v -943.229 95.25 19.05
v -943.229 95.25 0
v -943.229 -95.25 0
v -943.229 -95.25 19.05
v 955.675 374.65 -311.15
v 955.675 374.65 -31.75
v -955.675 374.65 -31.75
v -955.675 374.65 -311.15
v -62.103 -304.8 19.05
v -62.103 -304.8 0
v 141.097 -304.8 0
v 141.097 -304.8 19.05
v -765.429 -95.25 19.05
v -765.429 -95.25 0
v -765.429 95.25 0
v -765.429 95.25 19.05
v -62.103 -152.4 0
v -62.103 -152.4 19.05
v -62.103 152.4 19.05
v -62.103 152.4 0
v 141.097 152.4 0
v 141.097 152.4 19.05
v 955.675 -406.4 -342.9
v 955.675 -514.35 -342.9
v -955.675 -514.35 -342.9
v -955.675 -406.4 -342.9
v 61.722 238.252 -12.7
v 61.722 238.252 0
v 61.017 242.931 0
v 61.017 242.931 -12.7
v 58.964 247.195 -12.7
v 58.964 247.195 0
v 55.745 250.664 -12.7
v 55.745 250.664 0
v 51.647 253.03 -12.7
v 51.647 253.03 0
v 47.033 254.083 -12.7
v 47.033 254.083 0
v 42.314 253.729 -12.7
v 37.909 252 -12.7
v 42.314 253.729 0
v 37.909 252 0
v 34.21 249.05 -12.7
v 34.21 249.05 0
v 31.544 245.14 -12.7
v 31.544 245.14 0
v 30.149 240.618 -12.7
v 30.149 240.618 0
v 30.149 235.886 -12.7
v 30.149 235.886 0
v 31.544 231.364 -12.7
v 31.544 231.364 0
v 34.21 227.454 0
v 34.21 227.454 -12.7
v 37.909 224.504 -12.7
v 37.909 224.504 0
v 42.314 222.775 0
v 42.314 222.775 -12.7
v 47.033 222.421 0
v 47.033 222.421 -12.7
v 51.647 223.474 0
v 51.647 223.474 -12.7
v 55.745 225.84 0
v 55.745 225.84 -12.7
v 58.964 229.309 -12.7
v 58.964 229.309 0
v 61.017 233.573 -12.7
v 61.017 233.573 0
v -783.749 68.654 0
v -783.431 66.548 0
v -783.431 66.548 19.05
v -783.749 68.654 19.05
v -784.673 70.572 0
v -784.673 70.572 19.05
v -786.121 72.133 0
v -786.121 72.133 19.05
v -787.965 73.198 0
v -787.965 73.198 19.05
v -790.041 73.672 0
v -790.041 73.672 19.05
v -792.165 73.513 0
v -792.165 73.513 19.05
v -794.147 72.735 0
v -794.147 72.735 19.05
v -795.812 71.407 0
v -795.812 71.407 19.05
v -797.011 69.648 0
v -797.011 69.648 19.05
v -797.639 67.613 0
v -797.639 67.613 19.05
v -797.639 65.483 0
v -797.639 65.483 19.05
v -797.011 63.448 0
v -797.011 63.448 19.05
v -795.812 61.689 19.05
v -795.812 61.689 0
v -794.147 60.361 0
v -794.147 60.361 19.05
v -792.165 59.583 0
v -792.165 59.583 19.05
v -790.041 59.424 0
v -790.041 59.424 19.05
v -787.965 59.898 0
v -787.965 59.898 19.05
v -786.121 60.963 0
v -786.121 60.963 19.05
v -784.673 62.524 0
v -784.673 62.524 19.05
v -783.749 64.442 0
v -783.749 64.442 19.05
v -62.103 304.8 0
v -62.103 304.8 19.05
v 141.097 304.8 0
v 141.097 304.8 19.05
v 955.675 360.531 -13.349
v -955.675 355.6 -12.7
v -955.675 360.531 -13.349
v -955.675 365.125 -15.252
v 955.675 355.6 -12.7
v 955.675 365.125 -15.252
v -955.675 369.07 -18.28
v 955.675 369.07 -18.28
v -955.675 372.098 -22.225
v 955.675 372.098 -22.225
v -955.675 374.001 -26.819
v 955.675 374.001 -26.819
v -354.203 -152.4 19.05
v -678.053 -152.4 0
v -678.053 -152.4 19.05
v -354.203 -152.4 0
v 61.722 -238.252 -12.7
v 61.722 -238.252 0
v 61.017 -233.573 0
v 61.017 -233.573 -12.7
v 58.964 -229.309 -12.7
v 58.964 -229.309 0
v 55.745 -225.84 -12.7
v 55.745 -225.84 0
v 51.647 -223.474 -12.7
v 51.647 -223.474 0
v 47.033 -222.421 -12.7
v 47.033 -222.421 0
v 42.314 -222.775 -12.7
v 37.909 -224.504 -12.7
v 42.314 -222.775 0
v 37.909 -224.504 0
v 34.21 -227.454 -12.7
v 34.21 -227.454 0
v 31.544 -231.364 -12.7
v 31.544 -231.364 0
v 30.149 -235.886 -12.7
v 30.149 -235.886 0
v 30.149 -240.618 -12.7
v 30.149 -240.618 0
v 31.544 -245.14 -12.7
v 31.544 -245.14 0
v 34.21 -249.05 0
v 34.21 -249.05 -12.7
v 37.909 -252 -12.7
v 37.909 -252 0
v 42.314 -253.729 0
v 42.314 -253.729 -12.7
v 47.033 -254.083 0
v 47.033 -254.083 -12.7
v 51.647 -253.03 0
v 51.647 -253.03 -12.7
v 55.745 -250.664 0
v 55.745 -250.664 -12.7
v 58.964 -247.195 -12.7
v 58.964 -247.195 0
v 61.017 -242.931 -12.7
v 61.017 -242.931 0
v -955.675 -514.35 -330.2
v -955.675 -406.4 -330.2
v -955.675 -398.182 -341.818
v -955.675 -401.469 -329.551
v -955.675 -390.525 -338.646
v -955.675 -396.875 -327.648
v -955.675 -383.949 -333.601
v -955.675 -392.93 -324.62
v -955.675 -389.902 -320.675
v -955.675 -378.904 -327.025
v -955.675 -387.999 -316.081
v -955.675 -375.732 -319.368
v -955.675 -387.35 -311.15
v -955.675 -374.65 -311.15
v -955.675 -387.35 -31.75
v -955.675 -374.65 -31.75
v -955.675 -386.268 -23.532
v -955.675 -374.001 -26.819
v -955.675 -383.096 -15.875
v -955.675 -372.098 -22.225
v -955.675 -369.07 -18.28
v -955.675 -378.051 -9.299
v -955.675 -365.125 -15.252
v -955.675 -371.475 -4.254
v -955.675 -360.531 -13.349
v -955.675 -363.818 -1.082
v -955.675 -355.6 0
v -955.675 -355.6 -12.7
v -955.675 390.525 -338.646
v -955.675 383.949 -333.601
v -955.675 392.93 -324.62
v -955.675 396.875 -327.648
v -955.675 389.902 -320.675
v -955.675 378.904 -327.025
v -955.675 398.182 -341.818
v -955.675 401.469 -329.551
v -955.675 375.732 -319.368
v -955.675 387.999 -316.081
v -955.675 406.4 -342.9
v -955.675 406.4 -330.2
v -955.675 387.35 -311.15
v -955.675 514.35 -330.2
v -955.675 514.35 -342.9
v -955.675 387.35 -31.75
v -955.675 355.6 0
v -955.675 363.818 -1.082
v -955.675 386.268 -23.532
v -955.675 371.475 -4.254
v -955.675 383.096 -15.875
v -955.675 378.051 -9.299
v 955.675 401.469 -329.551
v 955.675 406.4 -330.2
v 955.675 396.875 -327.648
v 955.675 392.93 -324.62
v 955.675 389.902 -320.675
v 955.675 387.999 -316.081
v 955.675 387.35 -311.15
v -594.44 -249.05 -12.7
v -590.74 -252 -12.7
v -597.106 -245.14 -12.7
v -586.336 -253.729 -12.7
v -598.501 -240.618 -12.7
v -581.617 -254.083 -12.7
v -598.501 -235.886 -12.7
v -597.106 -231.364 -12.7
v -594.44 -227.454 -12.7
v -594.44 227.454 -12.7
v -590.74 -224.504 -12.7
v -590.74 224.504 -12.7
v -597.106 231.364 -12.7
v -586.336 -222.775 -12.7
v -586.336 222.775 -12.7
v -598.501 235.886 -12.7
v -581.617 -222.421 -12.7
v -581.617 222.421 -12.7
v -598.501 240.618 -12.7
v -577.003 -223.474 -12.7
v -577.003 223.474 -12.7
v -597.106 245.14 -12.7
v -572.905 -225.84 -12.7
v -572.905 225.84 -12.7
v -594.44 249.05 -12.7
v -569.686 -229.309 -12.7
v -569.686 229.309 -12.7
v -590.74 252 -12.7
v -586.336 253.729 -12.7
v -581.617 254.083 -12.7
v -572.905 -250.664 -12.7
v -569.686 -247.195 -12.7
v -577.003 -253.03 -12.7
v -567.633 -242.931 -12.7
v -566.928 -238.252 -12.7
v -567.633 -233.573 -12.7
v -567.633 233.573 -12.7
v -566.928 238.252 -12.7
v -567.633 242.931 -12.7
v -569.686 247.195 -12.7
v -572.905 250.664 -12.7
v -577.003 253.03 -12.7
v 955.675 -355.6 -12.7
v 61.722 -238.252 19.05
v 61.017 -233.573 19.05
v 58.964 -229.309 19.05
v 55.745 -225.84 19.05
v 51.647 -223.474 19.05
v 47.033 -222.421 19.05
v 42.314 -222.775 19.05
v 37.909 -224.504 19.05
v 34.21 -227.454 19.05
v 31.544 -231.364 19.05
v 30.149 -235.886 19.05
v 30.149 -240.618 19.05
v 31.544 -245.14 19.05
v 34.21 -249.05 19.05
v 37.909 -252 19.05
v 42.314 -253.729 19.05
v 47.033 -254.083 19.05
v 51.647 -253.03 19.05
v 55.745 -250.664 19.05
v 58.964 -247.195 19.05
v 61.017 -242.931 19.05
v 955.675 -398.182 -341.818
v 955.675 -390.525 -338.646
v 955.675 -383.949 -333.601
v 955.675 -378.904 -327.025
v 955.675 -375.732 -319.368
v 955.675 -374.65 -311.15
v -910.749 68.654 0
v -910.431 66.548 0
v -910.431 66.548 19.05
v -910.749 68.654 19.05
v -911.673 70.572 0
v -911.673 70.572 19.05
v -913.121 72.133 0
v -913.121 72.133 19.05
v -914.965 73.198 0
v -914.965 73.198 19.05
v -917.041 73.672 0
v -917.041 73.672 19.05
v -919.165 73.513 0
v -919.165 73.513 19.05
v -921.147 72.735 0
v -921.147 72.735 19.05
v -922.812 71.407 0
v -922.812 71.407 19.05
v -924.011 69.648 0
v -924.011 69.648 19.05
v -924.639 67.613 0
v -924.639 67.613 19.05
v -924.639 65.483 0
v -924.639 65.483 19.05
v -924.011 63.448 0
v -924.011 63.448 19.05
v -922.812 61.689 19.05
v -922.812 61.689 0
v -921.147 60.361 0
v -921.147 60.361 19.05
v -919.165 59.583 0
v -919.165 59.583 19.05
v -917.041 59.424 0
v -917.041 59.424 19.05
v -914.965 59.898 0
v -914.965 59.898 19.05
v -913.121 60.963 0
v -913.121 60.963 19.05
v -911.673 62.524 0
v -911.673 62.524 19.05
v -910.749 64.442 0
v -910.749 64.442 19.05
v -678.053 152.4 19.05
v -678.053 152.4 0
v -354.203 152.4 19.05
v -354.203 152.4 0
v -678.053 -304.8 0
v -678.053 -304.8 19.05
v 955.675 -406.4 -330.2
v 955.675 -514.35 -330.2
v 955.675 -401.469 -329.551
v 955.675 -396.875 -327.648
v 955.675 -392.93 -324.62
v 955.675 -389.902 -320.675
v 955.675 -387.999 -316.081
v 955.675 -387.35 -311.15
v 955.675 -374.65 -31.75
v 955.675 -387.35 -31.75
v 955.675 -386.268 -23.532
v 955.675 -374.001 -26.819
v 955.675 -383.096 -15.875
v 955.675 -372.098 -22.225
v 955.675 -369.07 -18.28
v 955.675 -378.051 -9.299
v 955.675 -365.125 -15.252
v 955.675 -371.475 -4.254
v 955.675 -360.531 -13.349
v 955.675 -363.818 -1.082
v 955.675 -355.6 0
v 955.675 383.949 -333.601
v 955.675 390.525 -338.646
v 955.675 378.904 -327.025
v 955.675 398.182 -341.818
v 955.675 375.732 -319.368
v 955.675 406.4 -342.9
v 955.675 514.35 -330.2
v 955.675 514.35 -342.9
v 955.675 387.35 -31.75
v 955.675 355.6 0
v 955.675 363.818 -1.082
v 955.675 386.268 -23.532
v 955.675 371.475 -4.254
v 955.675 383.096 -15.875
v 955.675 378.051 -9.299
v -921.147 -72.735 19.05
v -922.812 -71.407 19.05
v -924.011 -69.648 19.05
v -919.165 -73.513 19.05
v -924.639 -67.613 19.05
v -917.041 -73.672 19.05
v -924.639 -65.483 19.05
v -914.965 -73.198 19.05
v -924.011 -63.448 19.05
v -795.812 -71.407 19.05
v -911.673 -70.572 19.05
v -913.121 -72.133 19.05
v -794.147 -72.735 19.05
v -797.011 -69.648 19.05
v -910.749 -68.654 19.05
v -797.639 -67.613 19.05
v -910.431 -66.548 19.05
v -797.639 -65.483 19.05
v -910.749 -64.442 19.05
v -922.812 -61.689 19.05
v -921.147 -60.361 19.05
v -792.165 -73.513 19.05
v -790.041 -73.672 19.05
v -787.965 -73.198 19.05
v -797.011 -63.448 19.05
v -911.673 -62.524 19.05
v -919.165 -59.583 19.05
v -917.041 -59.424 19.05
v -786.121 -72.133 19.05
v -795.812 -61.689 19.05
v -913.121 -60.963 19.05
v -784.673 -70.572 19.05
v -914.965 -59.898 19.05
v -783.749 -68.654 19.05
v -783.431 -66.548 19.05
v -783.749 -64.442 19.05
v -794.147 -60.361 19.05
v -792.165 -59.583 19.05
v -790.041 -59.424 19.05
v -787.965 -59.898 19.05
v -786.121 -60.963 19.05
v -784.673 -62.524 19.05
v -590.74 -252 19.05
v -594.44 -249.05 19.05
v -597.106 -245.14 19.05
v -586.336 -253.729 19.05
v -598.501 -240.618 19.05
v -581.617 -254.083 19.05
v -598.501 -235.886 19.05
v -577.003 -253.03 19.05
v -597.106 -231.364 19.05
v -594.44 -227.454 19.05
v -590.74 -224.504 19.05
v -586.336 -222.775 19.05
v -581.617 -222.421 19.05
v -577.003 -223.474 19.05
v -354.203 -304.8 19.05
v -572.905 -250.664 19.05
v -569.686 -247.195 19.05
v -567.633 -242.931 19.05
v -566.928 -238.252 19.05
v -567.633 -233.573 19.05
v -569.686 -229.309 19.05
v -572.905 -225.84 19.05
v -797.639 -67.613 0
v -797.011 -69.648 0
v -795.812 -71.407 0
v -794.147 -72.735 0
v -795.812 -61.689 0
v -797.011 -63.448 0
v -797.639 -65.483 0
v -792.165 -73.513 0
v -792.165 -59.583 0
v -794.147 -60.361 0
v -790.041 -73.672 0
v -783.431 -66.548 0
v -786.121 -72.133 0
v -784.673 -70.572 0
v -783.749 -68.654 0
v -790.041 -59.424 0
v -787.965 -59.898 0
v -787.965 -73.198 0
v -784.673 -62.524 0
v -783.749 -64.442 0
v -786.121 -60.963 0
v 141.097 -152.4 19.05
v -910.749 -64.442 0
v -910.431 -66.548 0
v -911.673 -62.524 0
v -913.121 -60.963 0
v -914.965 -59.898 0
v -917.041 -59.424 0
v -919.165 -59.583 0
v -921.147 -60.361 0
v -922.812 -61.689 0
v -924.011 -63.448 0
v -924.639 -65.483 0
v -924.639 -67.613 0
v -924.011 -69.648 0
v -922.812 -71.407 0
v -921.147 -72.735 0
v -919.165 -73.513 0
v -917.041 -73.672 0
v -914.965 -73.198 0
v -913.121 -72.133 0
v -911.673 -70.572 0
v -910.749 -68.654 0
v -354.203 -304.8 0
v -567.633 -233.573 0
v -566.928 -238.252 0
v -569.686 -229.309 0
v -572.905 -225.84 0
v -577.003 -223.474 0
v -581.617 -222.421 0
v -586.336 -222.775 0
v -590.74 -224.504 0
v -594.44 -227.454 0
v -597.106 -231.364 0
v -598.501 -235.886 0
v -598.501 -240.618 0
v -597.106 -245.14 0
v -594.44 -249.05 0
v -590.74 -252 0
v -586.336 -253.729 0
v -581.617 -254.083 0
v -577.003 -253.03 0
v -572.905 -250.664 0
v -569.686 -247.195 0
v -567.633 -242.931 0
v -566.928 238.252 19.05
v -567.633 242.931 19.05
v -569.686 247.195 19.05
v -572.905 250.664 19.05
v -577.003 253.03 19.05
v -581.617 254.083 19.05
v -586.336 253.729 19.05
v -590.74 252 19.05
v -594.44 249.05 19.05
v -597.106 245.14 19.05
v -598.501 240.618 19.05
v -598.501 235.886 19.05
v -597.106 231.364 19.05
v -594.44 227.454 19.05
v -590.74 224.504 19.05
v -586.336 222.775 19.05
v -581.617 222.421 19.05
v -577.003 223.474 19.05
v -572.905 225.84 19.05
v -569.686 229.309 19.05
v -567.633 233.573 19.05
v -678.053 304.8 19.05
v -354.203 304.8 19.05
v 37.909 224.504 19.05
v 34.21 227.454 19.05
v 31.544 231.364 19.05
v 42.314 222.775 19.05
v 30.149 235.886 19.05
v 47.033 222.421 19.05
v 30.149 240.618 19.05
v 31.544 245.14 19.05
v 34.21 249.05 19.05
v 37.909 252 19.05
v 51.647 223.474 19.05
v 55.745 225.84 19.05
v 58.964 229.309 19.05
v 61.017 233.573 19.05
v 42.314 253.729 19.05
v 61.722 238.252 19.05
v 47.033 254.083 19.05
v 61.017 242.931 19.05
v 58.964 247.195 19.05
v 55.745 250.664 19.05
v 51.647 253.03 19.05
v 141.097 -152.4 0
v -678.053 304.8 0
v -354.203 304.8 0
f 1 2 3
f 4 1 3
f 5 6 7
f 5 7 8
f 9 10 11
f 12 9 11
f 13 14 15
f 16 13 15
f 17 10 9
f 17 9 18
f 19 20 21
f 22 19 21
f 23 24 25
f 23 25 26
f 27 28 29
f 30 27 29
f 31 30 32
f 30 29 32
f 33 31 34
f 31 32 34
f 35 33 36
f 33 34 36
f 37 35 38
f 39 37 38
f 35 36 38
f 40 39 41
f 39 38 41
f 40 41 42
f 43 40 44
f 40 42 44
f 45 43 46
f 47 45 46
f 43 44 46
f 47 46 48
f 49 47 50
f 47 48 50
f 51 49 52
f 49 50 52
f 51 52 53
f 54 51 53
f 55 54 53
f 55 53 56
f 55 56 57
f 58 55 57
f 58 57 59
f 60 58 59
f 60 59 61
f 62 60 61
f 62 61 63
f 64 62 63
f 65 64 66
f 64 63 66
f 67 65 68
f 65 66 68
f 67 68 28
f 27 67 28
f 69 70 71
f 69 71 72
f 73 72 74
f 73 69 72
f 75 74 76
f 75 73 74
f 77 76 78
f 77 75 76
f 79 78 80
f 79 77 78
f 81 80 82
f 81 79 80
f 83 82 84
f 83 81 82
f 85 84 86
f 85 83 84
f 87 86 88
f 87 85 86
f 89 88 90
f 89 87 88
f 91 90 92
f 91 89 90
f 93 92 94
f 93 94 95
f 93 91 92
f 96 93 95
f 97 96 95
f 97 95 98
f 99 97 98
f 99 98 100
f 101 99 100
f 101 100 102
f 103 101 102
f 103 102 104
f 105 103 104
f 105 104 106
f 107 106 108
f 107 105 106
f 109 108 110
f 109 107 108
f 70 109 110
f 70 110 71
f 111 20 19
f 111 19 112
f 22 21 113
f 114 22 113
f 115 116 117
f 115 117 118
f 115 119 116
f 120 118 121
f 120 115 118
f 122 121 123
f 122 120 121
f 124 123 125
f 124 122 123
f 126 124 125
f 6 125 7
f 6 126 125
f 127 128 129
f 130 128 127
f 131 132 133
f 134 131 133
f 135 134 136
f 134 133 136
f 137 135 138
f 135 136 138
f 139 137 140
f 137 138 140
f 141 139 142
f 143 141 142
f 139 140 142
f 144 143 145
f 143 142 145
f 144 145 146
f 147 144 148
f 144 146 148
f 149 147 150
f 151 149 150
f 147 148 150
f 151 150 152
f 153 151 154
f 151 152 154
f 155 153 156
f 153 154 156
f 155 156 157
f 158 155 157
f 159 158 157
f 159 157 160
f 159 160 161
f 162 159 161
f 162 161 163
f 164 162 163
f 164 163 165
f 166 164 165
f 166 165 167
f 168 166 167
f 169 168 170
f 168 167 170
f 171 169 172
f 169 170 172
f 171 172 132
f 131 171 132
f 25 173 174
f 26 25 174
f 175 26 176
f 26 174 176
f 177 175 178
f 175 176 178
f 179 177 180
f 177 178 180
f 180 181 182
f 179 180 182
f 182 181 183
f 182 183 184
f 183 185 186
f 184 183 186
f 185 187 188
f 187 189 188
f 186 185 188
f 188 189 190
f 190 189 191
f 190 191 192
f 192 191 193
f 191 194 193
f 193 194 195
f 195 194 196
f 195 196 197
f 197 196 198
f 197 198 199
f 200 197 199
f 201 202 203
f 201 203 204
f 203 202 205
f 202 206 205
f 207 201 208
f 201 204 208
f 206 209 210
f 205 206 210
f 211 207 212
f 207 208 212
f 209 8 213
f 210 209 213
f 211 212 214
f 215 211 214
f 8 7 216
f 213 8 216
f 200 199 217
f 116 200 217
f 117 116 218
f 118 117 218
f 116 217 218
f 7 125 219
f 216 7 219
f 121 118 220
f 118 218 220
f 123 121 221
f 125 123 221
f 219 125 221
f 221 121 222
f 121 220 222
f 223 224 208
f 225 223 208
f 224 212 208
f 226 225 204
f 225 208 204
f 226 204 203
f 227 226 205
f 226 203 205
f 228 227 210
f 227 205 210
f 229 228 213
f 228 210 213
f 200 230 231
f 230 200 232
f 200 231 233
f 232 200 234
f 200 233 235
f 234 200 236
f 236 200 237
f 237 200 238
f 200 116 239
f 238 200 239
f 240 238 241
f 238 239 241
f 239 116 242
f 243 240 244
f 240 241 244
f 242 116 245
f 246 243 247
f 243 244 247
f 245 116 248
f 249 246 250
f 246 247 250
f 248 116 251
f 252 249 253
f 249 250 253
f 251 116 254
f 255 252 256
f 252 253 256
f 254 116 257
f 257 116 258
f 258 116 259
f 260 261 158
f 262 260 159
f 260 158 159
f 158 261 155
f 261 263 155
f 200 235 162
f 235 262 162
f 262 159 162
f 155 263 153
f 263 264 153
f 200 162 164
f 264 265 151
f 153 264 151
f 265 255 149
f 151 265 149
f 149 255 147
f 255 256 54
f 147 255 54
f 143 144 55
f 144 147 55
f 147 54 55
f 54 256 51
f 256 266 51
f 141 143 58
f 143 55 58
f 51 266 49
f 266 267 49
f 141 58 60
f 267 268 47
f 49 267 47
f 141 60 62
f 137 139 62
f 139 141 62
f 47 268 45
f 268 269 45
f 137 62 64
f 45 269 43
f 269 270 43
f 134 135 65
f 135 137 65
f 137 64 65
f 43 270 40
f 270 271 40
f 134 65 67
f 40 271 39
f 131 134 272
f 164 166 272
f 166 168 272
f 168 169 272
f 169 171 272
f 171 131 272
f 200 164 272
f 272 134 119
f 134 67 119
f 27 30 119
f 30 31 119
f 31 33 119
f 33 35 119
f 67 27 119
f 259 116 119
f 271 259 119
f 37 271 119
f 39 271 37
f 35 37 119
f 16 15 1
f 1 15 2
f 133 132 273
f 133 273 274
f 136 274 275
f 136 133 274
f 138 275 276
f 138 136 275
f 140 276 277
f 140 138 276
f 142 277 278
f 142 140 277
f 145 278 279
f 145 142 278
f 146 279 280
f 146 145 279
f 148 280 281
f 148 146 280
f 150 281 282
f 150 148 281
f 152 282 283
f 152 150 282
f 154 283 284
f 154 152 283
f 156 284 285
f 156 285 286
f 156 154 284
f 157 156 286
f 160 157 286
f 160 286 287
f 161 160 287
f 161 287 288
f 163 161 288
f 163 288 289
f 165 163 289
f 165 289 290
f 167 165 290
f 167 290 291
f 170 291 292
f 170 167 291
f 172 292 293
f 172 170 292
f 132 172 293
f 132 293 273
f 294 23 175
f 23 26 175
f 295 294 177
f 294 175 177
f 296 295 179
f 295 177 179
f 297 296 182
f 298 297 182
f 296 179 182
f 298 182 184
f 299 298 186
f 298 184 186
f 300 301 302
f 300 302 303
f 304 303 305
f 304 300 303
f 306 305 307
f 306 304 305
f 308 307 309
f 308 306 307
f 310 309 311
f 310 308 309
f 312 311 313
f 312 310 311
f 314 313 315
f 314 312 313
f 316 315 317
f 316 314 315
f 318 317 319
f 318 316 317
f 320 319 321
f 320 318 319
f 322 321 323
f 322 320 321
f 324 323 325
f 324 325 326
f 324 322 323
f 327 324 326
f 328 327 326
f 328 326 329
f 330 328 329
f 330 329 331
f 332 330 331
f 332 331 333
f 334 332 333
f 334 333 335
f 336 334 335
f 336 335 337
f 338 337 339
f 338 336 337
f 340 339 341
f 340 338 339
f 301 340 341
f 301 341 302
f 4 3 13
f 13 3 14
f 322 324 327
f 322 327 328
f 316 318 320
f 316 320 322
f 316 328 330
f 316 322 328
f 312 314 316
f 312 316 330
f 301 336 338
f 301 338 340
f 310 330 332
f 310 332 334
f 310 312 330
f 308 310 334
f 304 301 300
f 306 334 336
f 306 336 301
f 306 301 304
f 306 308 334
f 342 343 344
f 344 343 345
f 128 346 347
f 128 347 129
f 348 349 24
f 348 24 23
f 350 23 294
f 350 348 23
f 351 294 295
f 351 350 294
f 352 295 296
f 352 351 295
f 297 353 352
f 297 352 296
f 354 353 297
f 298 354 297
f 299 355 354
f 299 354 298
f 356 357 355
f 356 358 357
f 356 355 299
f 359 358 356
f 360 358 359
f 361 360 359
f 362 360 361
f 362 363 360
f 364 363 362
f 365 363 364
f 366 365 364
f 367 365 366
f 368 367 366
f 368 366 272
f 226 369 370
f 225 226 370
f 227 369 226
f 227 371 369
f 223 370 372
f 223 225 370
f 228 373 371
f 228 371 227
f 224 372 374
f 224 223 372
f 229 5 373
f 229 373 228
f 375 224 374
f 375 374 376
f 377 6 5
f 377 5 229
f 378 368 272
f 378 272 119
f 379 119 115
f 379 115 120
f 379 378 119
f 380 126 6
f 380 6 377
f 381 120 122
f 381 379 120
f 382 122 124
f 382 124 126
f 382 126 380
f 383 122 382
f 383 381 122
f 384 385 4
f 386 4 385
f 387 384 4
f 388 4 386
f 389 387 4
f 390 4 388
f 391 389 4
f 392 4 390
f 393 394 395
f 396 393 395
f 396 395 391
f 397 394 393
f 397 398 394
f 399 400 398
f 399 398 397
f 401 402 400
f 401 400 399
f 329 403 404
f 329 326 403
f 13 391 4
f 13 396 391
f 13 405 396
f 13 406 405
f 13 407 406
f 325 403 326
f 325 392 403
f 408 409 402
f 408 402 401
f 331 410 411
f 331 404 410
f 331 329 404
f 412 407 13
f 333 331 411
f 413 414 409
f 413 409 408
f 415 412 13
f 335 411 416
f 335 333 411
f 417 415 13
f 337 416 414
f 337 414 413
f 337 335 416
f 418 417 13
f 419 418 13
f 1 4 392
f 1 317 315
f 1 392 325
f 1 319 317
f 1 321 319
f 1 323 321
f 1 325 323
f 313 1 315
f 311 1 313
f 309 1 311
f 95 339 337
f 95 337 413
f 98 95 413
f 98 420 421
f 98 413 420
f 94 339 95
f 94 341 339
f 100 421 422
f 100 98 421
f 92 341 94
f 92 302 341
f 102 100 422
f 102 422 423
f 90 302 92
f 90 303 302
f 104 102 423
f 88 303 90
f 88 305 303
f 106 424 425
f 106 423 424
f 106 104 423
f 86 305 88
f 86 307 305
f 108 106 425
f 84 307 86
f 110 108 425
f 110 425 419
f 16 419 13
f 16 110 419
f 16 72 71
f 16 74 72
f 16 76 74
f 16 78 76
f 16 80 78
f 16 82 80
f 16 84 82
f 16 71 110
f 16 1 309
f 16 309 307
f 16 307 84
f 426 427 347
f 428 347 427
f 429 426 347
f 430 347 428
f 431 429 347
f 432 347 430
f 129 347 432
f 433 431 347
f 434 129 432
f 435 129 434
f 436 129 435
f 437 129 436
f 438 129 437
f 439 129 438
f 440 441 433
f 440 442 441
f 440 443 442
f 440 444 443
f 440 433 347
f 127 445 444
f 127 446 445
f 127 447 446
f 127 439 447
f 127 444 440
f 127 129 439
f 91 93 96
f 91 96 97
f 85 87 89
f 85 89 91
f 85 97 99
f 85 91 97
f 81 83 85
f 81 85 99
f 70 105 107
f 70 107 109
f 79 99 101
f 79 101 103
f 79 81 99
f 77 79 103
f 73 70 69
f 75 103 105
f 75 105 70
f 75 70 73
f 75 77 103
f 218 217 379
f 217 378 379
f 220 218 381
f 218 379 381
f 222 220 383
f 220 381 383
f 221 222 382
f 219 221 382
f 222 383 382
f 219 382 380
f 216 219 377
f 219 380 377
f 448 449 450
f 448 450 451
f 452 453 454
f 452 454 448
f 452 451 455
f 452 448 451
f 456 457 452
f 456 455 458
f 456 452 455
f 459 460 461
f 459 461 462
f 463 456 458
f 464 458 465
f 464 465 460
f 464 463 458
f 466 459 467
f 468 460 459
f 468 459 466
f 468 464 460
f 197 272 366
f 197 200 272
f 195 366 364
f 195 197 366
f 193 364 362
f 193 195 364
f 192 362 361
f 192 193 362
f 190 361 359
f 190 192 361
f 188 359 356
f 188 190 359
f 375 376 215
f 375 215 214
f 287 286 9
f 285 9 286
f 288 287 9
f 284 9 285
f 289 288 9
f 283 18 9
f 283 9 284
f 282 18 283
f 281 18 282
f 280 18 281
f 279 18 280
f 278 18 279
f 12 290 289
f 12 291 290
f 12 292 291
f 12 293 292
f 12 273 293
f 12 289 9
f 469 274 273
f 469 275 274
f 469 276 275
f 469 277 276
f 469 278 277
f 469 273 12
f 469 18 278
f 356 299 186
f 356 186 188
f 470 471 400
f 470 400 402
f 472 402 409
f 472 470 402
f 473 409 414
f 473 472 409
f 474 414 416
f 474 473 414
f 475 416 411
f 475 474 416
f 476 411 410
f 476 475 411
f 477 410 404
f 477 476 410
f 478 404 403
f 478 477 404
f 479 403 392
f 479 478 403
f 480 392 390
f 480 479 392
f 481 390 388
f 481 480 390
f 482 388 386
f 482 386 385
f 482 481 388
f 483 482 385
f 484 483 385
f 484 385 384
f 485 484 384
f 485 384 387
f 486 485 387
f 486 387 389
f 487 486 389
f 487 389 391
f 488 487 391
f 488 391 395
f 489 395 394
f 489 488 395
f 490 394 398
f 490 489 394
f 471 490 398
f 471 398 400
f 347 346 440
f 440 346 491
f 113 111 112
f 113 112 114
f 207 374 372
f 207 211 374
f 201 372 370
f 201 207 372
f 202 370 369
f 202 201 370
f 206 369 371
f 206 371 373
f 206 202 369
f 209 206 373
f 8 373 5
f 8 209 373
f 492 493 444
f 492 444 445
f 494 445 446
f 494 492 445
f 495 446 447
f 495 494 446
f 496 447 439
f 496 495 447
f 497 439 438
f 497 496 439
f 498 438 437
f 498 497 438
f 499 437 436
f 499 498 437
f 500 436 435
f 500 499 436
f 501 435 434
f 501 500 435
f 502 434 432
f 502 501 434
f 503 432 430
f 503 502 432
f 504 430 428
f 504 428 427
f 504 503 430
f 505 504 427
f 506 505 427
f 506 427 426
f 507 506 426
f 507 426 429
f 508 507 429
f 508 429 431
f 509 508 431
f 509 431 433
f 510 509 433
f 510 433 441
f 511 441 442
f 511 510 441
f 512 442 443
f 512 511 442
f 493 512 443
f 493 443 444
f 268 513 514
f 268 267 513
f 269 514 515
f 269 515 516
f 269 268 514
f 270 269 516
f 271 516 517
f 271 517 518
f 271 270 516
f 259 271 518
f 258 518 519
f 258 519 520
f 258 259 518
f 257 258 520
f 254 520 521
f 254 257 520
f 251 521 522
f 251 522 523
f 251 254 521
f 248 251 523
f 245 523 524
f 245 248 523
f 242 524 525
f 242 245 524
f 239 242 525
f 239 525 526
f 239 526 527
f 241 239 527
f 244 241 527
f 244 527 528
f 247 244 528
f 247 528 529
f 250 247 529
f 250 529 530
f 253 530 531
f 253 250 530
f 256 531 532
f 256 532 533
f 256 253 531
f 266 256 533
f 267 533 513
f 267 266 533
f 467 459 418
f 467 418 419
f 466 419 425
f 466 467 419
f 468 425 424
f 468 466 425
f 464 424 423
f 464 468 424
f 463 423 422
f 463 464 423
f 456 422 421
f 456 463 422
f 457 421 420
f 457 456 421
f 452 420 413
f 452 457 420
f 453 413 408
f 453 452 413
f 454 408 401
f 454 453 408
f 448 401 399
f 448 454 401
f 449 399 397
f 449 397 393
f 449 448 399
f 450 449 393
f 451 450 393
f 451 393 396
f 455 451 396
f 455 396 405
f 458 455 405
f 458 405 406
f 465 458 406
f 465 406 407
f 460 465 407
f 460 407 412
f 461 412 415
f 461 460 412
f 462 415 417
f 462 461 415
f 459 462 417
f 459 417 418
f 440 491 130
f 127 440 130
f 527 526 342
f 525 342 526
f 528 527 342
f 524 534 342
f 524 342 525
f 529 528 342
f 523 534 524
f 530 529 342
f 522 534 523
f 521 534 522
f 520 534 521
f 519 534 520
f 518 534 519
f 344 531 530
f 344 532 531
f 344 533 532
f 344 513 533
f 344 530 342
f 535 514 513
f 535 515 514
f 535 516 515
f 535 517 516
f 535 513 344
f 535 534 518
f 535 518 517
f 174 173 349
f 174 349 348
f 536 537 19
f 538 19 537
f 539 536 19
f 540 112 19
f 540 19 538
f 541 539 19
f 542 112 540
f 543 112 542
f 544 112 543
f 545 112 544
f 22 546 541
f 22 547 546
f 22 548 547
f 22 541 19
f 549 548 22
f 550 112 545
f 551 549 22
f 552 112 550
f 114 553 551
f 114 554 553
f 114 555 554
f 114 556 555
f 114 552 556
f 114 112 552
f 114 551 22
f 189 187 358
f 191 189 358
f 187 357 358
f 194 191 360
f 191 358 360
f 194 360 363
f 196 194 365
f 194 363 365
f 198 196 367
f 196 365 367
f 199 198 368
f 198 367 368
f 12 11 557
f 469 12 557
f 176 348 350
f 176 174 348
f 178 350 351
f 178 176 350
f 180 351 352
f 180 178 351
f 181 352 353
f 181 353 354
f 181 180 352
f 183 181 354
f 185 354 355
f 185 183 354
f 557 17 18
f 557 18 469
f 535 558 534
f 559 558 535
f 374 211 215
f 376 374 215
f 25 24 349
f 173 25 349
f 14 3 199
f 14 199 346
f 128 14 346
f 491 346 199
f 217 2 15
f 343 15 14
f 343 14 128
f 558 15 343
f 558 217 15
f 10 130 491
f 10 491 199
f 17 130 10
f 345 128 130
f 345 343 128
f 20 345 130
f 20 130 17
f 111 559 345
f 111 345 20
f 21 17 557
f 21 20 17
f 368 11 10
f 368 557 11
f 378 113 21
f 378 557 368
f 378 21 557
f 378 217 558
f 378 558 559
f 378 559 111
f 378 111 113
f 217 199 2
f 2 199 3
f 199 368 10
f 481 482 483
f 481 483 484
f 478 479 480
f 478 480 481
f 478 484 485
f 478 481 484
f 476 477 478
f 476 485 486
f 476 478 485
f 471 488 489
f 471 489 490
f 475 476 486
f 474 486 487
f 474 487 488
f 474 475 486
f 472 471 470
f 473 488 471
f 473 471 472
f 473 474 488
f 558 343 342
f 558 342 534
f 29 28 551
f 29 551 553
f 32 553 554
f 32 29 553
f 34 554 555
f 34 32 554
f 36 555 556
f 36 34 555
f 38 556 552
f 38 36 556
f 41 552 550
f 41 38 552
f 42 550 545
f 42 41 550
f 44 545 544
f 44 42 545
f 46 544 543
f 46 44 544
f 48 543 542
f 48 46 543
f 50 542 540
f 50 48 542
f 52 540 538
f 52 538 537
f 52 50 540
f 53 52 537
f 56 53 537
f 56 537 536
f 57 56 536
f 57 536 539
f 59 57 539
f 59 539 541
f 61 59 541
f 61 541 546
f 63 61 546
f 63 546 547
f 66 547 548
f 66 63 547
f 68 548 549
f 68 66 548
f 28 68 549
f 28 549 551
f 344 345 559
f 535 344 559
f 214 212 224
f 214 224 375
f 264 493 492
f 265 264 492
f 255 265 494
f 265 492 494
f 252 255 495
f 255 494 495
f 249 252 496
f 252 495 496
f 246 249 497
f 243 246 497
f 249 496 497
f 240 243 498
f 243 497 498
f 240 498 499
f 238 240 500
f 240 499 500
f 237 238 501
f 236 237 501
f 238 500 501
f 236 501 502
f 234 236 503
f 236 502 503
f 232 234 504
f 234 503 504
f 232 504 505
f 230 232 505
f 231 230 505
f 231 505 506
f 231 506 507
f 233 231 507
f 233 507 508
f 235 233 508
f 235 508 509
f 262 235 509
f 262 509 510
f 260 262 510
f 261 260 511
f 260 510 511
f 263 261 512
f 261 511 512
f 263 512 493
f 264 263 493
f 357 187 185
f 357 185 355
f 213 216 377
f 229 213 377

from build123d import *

# Parameters (mm, degrees)
F0_W     = 1911.35
F0_H     = 774.7
F0_W_2   = 323.85
F0_H_2   = 152.4
F0_W_3   = 203.2
F0_R     = 15.875
F1_DEPTH = 12.7
F2_DEPTH = 19.05
F3_W     = 12.7
F3_H     = 330.2
F3_H_2   = 12.7
F3_W_2   = 127
F4_DEPTH = 1911.35
F5_R     = 19.05
F6_R     = 31.75
F7_R     = 7.14375
F8_DEPTH = 19.05


with BuildPart() as f1:
    # F0 (on Top) → F1 (new body)
    with BuildSketch(Plane.XY):
        Rectangle(F0_W, F0_H)
        with Locations((-516.128, -228.6)):
            Rectangle(F0_W_2, F0_H_2, mode=Mode.SUBTRACT)
        with Locations((39.497, -228.6)):
            Rectangle(F0_W_3, F0_H_2, mode=Mode.SUBTRACT)
        with Locations((-516.128, 228.6)):
            Rectangle(F0_W_2, F0_H_2, mode=Mode.SUBTRACT)
        with Locations((39.497, 228.6)):
            Rectangle(F0_W_3, F0_H_2, mode=Mode.SUBTRACT)
        with Locations((-516.128, 228.6)):
            Rectangle(F0_W_2, F0_H_2)
        with Locations((-582.803, 238.252)):
            Circle(F0_R, mode=Mode.SUBTRACT)
        with Locations((-516.128, -228.6)):
            Rectangle(F0_W_2, F0_H_2)
        with Locations((-582.803, -238.252)):
            Circle(F0_R, mode=Mode.SUBTRACT)
        with Locations((39.497, 228.6)):
            Rectangle(F0_W_3, F0_H_2)
        with Locations((45.847, 238.252)):
            Circle(F0_R, mode=Mode.SUBTRACT)
        with Locations((39.497, -228.6)):
            Rectangle(F0_W_3, F0_H_2)
        with Locations((45.847, -238.252)):
            Circle(F0_R, mode=Mode.SUBTRACT)
    extrude(amount=-F1_DEPTH)

    # F0 (on Top) → F2 (join)
    with BuildSketch(Plane.XY):
        with Locations((-516.128, 228.6)):
            Rectangle(F0_W_2, F0_H_2)
        with Locations((-582.803, 238.252)):
            Circle(F0_R, mode=Mode.SUBTRACT)
        with Locations((-516.128, -228.6)):
            Rectangle(F0_W_2, F0_H_2)
        with Locations((-582.803, -238.252)):
            Circle(F0_R, mode=Mode.SUBTRACT)
        with Locations((39.497, 228.6)):
            Rectangle(F0_W_3, F0_H_2)
        with Locations((45.847, 238.252)):
            Circle(F0_R, mode=Mode.SUBTRACT)
        with Locations((39.497, -228.6)):
            Rectangle(F0_W_3, F0_H_2)
        with Locations((45.847, -238.252)):
            Circle(F0_R, mode=Mode.SUBTRACT)
    extrude(amount=F2_DEPTH)

    # F3 (on face) → F4 (join)
    with BuildSketch(Plane.YZ.offset(955.675)):
        with Locations((-381, -165.1)):
            Rectangle(F3_W, F3_H)
        with Locations((-381, -336.55)):
            Rectangle(F3_W, F3_H_2)
        with Locations((-450.85, -336.55)):
            Rectangle(F3_W_2, F3_H_2)
        with Locations((381, -165.1)):
            Rectangle(F3_W, F3_H)
        with Locations((450.85, -336.55)):
            Rectangle(F3_W_2, F3_H_2)
        with Locations((381, -336.55)):
            Rectangle(F3_W, F3_H_2)
    extrude(amount=-F4_DEPTH)

    # F5
    f5_edges = [f1.edges().sort_by_distance(p)[0] for p in [
        (0, -387.35, -330.2),
        (0, 387.35, -330.2),
        (0, 374.65, -12.7),
        (0, -374.65, -12.7),
    ]]
    fillet(f5_edges, radius=F5_R)

    # F6
    f6_edges = [f1.edges().sort_by_distance(p)[0] for p in [
        (0, 374.65, -342.9),
        (0, -374.65, -342.9),
        (0, 387.35, 0),
        (0, -387.35, 0),
    ]]
    fillet(f6_edges, radius=F6_R)

    # F7 (on face) → F8 (join)
    with BuildSketch(Plane.XY):
        Polygon((-765.429, -95.25), (-765.429, 0), (-765.429, 95.25), (-943.229, 95.25), (-943.229, 0), (-943.229, -95.25), align=None)
        with Locations((-917.575, -66.548)):
            Circle(F7_R, mode=Mode.SUBTRACT)
        with Locations((-790.575, -66.548)):
            Circle(F7_R, mode=Mode.SUBTRACT)
        with Locations((-917.575, 66.548)):
            Circle(F7_R, mode=Mode.SUBTRACT)
        with Locations((-790.575, 66.548)):
            Circle(F7_R, mode=Mode.SUBTRACT)
    extrude(amount=F8_DEPTH)


solid = f1.part
